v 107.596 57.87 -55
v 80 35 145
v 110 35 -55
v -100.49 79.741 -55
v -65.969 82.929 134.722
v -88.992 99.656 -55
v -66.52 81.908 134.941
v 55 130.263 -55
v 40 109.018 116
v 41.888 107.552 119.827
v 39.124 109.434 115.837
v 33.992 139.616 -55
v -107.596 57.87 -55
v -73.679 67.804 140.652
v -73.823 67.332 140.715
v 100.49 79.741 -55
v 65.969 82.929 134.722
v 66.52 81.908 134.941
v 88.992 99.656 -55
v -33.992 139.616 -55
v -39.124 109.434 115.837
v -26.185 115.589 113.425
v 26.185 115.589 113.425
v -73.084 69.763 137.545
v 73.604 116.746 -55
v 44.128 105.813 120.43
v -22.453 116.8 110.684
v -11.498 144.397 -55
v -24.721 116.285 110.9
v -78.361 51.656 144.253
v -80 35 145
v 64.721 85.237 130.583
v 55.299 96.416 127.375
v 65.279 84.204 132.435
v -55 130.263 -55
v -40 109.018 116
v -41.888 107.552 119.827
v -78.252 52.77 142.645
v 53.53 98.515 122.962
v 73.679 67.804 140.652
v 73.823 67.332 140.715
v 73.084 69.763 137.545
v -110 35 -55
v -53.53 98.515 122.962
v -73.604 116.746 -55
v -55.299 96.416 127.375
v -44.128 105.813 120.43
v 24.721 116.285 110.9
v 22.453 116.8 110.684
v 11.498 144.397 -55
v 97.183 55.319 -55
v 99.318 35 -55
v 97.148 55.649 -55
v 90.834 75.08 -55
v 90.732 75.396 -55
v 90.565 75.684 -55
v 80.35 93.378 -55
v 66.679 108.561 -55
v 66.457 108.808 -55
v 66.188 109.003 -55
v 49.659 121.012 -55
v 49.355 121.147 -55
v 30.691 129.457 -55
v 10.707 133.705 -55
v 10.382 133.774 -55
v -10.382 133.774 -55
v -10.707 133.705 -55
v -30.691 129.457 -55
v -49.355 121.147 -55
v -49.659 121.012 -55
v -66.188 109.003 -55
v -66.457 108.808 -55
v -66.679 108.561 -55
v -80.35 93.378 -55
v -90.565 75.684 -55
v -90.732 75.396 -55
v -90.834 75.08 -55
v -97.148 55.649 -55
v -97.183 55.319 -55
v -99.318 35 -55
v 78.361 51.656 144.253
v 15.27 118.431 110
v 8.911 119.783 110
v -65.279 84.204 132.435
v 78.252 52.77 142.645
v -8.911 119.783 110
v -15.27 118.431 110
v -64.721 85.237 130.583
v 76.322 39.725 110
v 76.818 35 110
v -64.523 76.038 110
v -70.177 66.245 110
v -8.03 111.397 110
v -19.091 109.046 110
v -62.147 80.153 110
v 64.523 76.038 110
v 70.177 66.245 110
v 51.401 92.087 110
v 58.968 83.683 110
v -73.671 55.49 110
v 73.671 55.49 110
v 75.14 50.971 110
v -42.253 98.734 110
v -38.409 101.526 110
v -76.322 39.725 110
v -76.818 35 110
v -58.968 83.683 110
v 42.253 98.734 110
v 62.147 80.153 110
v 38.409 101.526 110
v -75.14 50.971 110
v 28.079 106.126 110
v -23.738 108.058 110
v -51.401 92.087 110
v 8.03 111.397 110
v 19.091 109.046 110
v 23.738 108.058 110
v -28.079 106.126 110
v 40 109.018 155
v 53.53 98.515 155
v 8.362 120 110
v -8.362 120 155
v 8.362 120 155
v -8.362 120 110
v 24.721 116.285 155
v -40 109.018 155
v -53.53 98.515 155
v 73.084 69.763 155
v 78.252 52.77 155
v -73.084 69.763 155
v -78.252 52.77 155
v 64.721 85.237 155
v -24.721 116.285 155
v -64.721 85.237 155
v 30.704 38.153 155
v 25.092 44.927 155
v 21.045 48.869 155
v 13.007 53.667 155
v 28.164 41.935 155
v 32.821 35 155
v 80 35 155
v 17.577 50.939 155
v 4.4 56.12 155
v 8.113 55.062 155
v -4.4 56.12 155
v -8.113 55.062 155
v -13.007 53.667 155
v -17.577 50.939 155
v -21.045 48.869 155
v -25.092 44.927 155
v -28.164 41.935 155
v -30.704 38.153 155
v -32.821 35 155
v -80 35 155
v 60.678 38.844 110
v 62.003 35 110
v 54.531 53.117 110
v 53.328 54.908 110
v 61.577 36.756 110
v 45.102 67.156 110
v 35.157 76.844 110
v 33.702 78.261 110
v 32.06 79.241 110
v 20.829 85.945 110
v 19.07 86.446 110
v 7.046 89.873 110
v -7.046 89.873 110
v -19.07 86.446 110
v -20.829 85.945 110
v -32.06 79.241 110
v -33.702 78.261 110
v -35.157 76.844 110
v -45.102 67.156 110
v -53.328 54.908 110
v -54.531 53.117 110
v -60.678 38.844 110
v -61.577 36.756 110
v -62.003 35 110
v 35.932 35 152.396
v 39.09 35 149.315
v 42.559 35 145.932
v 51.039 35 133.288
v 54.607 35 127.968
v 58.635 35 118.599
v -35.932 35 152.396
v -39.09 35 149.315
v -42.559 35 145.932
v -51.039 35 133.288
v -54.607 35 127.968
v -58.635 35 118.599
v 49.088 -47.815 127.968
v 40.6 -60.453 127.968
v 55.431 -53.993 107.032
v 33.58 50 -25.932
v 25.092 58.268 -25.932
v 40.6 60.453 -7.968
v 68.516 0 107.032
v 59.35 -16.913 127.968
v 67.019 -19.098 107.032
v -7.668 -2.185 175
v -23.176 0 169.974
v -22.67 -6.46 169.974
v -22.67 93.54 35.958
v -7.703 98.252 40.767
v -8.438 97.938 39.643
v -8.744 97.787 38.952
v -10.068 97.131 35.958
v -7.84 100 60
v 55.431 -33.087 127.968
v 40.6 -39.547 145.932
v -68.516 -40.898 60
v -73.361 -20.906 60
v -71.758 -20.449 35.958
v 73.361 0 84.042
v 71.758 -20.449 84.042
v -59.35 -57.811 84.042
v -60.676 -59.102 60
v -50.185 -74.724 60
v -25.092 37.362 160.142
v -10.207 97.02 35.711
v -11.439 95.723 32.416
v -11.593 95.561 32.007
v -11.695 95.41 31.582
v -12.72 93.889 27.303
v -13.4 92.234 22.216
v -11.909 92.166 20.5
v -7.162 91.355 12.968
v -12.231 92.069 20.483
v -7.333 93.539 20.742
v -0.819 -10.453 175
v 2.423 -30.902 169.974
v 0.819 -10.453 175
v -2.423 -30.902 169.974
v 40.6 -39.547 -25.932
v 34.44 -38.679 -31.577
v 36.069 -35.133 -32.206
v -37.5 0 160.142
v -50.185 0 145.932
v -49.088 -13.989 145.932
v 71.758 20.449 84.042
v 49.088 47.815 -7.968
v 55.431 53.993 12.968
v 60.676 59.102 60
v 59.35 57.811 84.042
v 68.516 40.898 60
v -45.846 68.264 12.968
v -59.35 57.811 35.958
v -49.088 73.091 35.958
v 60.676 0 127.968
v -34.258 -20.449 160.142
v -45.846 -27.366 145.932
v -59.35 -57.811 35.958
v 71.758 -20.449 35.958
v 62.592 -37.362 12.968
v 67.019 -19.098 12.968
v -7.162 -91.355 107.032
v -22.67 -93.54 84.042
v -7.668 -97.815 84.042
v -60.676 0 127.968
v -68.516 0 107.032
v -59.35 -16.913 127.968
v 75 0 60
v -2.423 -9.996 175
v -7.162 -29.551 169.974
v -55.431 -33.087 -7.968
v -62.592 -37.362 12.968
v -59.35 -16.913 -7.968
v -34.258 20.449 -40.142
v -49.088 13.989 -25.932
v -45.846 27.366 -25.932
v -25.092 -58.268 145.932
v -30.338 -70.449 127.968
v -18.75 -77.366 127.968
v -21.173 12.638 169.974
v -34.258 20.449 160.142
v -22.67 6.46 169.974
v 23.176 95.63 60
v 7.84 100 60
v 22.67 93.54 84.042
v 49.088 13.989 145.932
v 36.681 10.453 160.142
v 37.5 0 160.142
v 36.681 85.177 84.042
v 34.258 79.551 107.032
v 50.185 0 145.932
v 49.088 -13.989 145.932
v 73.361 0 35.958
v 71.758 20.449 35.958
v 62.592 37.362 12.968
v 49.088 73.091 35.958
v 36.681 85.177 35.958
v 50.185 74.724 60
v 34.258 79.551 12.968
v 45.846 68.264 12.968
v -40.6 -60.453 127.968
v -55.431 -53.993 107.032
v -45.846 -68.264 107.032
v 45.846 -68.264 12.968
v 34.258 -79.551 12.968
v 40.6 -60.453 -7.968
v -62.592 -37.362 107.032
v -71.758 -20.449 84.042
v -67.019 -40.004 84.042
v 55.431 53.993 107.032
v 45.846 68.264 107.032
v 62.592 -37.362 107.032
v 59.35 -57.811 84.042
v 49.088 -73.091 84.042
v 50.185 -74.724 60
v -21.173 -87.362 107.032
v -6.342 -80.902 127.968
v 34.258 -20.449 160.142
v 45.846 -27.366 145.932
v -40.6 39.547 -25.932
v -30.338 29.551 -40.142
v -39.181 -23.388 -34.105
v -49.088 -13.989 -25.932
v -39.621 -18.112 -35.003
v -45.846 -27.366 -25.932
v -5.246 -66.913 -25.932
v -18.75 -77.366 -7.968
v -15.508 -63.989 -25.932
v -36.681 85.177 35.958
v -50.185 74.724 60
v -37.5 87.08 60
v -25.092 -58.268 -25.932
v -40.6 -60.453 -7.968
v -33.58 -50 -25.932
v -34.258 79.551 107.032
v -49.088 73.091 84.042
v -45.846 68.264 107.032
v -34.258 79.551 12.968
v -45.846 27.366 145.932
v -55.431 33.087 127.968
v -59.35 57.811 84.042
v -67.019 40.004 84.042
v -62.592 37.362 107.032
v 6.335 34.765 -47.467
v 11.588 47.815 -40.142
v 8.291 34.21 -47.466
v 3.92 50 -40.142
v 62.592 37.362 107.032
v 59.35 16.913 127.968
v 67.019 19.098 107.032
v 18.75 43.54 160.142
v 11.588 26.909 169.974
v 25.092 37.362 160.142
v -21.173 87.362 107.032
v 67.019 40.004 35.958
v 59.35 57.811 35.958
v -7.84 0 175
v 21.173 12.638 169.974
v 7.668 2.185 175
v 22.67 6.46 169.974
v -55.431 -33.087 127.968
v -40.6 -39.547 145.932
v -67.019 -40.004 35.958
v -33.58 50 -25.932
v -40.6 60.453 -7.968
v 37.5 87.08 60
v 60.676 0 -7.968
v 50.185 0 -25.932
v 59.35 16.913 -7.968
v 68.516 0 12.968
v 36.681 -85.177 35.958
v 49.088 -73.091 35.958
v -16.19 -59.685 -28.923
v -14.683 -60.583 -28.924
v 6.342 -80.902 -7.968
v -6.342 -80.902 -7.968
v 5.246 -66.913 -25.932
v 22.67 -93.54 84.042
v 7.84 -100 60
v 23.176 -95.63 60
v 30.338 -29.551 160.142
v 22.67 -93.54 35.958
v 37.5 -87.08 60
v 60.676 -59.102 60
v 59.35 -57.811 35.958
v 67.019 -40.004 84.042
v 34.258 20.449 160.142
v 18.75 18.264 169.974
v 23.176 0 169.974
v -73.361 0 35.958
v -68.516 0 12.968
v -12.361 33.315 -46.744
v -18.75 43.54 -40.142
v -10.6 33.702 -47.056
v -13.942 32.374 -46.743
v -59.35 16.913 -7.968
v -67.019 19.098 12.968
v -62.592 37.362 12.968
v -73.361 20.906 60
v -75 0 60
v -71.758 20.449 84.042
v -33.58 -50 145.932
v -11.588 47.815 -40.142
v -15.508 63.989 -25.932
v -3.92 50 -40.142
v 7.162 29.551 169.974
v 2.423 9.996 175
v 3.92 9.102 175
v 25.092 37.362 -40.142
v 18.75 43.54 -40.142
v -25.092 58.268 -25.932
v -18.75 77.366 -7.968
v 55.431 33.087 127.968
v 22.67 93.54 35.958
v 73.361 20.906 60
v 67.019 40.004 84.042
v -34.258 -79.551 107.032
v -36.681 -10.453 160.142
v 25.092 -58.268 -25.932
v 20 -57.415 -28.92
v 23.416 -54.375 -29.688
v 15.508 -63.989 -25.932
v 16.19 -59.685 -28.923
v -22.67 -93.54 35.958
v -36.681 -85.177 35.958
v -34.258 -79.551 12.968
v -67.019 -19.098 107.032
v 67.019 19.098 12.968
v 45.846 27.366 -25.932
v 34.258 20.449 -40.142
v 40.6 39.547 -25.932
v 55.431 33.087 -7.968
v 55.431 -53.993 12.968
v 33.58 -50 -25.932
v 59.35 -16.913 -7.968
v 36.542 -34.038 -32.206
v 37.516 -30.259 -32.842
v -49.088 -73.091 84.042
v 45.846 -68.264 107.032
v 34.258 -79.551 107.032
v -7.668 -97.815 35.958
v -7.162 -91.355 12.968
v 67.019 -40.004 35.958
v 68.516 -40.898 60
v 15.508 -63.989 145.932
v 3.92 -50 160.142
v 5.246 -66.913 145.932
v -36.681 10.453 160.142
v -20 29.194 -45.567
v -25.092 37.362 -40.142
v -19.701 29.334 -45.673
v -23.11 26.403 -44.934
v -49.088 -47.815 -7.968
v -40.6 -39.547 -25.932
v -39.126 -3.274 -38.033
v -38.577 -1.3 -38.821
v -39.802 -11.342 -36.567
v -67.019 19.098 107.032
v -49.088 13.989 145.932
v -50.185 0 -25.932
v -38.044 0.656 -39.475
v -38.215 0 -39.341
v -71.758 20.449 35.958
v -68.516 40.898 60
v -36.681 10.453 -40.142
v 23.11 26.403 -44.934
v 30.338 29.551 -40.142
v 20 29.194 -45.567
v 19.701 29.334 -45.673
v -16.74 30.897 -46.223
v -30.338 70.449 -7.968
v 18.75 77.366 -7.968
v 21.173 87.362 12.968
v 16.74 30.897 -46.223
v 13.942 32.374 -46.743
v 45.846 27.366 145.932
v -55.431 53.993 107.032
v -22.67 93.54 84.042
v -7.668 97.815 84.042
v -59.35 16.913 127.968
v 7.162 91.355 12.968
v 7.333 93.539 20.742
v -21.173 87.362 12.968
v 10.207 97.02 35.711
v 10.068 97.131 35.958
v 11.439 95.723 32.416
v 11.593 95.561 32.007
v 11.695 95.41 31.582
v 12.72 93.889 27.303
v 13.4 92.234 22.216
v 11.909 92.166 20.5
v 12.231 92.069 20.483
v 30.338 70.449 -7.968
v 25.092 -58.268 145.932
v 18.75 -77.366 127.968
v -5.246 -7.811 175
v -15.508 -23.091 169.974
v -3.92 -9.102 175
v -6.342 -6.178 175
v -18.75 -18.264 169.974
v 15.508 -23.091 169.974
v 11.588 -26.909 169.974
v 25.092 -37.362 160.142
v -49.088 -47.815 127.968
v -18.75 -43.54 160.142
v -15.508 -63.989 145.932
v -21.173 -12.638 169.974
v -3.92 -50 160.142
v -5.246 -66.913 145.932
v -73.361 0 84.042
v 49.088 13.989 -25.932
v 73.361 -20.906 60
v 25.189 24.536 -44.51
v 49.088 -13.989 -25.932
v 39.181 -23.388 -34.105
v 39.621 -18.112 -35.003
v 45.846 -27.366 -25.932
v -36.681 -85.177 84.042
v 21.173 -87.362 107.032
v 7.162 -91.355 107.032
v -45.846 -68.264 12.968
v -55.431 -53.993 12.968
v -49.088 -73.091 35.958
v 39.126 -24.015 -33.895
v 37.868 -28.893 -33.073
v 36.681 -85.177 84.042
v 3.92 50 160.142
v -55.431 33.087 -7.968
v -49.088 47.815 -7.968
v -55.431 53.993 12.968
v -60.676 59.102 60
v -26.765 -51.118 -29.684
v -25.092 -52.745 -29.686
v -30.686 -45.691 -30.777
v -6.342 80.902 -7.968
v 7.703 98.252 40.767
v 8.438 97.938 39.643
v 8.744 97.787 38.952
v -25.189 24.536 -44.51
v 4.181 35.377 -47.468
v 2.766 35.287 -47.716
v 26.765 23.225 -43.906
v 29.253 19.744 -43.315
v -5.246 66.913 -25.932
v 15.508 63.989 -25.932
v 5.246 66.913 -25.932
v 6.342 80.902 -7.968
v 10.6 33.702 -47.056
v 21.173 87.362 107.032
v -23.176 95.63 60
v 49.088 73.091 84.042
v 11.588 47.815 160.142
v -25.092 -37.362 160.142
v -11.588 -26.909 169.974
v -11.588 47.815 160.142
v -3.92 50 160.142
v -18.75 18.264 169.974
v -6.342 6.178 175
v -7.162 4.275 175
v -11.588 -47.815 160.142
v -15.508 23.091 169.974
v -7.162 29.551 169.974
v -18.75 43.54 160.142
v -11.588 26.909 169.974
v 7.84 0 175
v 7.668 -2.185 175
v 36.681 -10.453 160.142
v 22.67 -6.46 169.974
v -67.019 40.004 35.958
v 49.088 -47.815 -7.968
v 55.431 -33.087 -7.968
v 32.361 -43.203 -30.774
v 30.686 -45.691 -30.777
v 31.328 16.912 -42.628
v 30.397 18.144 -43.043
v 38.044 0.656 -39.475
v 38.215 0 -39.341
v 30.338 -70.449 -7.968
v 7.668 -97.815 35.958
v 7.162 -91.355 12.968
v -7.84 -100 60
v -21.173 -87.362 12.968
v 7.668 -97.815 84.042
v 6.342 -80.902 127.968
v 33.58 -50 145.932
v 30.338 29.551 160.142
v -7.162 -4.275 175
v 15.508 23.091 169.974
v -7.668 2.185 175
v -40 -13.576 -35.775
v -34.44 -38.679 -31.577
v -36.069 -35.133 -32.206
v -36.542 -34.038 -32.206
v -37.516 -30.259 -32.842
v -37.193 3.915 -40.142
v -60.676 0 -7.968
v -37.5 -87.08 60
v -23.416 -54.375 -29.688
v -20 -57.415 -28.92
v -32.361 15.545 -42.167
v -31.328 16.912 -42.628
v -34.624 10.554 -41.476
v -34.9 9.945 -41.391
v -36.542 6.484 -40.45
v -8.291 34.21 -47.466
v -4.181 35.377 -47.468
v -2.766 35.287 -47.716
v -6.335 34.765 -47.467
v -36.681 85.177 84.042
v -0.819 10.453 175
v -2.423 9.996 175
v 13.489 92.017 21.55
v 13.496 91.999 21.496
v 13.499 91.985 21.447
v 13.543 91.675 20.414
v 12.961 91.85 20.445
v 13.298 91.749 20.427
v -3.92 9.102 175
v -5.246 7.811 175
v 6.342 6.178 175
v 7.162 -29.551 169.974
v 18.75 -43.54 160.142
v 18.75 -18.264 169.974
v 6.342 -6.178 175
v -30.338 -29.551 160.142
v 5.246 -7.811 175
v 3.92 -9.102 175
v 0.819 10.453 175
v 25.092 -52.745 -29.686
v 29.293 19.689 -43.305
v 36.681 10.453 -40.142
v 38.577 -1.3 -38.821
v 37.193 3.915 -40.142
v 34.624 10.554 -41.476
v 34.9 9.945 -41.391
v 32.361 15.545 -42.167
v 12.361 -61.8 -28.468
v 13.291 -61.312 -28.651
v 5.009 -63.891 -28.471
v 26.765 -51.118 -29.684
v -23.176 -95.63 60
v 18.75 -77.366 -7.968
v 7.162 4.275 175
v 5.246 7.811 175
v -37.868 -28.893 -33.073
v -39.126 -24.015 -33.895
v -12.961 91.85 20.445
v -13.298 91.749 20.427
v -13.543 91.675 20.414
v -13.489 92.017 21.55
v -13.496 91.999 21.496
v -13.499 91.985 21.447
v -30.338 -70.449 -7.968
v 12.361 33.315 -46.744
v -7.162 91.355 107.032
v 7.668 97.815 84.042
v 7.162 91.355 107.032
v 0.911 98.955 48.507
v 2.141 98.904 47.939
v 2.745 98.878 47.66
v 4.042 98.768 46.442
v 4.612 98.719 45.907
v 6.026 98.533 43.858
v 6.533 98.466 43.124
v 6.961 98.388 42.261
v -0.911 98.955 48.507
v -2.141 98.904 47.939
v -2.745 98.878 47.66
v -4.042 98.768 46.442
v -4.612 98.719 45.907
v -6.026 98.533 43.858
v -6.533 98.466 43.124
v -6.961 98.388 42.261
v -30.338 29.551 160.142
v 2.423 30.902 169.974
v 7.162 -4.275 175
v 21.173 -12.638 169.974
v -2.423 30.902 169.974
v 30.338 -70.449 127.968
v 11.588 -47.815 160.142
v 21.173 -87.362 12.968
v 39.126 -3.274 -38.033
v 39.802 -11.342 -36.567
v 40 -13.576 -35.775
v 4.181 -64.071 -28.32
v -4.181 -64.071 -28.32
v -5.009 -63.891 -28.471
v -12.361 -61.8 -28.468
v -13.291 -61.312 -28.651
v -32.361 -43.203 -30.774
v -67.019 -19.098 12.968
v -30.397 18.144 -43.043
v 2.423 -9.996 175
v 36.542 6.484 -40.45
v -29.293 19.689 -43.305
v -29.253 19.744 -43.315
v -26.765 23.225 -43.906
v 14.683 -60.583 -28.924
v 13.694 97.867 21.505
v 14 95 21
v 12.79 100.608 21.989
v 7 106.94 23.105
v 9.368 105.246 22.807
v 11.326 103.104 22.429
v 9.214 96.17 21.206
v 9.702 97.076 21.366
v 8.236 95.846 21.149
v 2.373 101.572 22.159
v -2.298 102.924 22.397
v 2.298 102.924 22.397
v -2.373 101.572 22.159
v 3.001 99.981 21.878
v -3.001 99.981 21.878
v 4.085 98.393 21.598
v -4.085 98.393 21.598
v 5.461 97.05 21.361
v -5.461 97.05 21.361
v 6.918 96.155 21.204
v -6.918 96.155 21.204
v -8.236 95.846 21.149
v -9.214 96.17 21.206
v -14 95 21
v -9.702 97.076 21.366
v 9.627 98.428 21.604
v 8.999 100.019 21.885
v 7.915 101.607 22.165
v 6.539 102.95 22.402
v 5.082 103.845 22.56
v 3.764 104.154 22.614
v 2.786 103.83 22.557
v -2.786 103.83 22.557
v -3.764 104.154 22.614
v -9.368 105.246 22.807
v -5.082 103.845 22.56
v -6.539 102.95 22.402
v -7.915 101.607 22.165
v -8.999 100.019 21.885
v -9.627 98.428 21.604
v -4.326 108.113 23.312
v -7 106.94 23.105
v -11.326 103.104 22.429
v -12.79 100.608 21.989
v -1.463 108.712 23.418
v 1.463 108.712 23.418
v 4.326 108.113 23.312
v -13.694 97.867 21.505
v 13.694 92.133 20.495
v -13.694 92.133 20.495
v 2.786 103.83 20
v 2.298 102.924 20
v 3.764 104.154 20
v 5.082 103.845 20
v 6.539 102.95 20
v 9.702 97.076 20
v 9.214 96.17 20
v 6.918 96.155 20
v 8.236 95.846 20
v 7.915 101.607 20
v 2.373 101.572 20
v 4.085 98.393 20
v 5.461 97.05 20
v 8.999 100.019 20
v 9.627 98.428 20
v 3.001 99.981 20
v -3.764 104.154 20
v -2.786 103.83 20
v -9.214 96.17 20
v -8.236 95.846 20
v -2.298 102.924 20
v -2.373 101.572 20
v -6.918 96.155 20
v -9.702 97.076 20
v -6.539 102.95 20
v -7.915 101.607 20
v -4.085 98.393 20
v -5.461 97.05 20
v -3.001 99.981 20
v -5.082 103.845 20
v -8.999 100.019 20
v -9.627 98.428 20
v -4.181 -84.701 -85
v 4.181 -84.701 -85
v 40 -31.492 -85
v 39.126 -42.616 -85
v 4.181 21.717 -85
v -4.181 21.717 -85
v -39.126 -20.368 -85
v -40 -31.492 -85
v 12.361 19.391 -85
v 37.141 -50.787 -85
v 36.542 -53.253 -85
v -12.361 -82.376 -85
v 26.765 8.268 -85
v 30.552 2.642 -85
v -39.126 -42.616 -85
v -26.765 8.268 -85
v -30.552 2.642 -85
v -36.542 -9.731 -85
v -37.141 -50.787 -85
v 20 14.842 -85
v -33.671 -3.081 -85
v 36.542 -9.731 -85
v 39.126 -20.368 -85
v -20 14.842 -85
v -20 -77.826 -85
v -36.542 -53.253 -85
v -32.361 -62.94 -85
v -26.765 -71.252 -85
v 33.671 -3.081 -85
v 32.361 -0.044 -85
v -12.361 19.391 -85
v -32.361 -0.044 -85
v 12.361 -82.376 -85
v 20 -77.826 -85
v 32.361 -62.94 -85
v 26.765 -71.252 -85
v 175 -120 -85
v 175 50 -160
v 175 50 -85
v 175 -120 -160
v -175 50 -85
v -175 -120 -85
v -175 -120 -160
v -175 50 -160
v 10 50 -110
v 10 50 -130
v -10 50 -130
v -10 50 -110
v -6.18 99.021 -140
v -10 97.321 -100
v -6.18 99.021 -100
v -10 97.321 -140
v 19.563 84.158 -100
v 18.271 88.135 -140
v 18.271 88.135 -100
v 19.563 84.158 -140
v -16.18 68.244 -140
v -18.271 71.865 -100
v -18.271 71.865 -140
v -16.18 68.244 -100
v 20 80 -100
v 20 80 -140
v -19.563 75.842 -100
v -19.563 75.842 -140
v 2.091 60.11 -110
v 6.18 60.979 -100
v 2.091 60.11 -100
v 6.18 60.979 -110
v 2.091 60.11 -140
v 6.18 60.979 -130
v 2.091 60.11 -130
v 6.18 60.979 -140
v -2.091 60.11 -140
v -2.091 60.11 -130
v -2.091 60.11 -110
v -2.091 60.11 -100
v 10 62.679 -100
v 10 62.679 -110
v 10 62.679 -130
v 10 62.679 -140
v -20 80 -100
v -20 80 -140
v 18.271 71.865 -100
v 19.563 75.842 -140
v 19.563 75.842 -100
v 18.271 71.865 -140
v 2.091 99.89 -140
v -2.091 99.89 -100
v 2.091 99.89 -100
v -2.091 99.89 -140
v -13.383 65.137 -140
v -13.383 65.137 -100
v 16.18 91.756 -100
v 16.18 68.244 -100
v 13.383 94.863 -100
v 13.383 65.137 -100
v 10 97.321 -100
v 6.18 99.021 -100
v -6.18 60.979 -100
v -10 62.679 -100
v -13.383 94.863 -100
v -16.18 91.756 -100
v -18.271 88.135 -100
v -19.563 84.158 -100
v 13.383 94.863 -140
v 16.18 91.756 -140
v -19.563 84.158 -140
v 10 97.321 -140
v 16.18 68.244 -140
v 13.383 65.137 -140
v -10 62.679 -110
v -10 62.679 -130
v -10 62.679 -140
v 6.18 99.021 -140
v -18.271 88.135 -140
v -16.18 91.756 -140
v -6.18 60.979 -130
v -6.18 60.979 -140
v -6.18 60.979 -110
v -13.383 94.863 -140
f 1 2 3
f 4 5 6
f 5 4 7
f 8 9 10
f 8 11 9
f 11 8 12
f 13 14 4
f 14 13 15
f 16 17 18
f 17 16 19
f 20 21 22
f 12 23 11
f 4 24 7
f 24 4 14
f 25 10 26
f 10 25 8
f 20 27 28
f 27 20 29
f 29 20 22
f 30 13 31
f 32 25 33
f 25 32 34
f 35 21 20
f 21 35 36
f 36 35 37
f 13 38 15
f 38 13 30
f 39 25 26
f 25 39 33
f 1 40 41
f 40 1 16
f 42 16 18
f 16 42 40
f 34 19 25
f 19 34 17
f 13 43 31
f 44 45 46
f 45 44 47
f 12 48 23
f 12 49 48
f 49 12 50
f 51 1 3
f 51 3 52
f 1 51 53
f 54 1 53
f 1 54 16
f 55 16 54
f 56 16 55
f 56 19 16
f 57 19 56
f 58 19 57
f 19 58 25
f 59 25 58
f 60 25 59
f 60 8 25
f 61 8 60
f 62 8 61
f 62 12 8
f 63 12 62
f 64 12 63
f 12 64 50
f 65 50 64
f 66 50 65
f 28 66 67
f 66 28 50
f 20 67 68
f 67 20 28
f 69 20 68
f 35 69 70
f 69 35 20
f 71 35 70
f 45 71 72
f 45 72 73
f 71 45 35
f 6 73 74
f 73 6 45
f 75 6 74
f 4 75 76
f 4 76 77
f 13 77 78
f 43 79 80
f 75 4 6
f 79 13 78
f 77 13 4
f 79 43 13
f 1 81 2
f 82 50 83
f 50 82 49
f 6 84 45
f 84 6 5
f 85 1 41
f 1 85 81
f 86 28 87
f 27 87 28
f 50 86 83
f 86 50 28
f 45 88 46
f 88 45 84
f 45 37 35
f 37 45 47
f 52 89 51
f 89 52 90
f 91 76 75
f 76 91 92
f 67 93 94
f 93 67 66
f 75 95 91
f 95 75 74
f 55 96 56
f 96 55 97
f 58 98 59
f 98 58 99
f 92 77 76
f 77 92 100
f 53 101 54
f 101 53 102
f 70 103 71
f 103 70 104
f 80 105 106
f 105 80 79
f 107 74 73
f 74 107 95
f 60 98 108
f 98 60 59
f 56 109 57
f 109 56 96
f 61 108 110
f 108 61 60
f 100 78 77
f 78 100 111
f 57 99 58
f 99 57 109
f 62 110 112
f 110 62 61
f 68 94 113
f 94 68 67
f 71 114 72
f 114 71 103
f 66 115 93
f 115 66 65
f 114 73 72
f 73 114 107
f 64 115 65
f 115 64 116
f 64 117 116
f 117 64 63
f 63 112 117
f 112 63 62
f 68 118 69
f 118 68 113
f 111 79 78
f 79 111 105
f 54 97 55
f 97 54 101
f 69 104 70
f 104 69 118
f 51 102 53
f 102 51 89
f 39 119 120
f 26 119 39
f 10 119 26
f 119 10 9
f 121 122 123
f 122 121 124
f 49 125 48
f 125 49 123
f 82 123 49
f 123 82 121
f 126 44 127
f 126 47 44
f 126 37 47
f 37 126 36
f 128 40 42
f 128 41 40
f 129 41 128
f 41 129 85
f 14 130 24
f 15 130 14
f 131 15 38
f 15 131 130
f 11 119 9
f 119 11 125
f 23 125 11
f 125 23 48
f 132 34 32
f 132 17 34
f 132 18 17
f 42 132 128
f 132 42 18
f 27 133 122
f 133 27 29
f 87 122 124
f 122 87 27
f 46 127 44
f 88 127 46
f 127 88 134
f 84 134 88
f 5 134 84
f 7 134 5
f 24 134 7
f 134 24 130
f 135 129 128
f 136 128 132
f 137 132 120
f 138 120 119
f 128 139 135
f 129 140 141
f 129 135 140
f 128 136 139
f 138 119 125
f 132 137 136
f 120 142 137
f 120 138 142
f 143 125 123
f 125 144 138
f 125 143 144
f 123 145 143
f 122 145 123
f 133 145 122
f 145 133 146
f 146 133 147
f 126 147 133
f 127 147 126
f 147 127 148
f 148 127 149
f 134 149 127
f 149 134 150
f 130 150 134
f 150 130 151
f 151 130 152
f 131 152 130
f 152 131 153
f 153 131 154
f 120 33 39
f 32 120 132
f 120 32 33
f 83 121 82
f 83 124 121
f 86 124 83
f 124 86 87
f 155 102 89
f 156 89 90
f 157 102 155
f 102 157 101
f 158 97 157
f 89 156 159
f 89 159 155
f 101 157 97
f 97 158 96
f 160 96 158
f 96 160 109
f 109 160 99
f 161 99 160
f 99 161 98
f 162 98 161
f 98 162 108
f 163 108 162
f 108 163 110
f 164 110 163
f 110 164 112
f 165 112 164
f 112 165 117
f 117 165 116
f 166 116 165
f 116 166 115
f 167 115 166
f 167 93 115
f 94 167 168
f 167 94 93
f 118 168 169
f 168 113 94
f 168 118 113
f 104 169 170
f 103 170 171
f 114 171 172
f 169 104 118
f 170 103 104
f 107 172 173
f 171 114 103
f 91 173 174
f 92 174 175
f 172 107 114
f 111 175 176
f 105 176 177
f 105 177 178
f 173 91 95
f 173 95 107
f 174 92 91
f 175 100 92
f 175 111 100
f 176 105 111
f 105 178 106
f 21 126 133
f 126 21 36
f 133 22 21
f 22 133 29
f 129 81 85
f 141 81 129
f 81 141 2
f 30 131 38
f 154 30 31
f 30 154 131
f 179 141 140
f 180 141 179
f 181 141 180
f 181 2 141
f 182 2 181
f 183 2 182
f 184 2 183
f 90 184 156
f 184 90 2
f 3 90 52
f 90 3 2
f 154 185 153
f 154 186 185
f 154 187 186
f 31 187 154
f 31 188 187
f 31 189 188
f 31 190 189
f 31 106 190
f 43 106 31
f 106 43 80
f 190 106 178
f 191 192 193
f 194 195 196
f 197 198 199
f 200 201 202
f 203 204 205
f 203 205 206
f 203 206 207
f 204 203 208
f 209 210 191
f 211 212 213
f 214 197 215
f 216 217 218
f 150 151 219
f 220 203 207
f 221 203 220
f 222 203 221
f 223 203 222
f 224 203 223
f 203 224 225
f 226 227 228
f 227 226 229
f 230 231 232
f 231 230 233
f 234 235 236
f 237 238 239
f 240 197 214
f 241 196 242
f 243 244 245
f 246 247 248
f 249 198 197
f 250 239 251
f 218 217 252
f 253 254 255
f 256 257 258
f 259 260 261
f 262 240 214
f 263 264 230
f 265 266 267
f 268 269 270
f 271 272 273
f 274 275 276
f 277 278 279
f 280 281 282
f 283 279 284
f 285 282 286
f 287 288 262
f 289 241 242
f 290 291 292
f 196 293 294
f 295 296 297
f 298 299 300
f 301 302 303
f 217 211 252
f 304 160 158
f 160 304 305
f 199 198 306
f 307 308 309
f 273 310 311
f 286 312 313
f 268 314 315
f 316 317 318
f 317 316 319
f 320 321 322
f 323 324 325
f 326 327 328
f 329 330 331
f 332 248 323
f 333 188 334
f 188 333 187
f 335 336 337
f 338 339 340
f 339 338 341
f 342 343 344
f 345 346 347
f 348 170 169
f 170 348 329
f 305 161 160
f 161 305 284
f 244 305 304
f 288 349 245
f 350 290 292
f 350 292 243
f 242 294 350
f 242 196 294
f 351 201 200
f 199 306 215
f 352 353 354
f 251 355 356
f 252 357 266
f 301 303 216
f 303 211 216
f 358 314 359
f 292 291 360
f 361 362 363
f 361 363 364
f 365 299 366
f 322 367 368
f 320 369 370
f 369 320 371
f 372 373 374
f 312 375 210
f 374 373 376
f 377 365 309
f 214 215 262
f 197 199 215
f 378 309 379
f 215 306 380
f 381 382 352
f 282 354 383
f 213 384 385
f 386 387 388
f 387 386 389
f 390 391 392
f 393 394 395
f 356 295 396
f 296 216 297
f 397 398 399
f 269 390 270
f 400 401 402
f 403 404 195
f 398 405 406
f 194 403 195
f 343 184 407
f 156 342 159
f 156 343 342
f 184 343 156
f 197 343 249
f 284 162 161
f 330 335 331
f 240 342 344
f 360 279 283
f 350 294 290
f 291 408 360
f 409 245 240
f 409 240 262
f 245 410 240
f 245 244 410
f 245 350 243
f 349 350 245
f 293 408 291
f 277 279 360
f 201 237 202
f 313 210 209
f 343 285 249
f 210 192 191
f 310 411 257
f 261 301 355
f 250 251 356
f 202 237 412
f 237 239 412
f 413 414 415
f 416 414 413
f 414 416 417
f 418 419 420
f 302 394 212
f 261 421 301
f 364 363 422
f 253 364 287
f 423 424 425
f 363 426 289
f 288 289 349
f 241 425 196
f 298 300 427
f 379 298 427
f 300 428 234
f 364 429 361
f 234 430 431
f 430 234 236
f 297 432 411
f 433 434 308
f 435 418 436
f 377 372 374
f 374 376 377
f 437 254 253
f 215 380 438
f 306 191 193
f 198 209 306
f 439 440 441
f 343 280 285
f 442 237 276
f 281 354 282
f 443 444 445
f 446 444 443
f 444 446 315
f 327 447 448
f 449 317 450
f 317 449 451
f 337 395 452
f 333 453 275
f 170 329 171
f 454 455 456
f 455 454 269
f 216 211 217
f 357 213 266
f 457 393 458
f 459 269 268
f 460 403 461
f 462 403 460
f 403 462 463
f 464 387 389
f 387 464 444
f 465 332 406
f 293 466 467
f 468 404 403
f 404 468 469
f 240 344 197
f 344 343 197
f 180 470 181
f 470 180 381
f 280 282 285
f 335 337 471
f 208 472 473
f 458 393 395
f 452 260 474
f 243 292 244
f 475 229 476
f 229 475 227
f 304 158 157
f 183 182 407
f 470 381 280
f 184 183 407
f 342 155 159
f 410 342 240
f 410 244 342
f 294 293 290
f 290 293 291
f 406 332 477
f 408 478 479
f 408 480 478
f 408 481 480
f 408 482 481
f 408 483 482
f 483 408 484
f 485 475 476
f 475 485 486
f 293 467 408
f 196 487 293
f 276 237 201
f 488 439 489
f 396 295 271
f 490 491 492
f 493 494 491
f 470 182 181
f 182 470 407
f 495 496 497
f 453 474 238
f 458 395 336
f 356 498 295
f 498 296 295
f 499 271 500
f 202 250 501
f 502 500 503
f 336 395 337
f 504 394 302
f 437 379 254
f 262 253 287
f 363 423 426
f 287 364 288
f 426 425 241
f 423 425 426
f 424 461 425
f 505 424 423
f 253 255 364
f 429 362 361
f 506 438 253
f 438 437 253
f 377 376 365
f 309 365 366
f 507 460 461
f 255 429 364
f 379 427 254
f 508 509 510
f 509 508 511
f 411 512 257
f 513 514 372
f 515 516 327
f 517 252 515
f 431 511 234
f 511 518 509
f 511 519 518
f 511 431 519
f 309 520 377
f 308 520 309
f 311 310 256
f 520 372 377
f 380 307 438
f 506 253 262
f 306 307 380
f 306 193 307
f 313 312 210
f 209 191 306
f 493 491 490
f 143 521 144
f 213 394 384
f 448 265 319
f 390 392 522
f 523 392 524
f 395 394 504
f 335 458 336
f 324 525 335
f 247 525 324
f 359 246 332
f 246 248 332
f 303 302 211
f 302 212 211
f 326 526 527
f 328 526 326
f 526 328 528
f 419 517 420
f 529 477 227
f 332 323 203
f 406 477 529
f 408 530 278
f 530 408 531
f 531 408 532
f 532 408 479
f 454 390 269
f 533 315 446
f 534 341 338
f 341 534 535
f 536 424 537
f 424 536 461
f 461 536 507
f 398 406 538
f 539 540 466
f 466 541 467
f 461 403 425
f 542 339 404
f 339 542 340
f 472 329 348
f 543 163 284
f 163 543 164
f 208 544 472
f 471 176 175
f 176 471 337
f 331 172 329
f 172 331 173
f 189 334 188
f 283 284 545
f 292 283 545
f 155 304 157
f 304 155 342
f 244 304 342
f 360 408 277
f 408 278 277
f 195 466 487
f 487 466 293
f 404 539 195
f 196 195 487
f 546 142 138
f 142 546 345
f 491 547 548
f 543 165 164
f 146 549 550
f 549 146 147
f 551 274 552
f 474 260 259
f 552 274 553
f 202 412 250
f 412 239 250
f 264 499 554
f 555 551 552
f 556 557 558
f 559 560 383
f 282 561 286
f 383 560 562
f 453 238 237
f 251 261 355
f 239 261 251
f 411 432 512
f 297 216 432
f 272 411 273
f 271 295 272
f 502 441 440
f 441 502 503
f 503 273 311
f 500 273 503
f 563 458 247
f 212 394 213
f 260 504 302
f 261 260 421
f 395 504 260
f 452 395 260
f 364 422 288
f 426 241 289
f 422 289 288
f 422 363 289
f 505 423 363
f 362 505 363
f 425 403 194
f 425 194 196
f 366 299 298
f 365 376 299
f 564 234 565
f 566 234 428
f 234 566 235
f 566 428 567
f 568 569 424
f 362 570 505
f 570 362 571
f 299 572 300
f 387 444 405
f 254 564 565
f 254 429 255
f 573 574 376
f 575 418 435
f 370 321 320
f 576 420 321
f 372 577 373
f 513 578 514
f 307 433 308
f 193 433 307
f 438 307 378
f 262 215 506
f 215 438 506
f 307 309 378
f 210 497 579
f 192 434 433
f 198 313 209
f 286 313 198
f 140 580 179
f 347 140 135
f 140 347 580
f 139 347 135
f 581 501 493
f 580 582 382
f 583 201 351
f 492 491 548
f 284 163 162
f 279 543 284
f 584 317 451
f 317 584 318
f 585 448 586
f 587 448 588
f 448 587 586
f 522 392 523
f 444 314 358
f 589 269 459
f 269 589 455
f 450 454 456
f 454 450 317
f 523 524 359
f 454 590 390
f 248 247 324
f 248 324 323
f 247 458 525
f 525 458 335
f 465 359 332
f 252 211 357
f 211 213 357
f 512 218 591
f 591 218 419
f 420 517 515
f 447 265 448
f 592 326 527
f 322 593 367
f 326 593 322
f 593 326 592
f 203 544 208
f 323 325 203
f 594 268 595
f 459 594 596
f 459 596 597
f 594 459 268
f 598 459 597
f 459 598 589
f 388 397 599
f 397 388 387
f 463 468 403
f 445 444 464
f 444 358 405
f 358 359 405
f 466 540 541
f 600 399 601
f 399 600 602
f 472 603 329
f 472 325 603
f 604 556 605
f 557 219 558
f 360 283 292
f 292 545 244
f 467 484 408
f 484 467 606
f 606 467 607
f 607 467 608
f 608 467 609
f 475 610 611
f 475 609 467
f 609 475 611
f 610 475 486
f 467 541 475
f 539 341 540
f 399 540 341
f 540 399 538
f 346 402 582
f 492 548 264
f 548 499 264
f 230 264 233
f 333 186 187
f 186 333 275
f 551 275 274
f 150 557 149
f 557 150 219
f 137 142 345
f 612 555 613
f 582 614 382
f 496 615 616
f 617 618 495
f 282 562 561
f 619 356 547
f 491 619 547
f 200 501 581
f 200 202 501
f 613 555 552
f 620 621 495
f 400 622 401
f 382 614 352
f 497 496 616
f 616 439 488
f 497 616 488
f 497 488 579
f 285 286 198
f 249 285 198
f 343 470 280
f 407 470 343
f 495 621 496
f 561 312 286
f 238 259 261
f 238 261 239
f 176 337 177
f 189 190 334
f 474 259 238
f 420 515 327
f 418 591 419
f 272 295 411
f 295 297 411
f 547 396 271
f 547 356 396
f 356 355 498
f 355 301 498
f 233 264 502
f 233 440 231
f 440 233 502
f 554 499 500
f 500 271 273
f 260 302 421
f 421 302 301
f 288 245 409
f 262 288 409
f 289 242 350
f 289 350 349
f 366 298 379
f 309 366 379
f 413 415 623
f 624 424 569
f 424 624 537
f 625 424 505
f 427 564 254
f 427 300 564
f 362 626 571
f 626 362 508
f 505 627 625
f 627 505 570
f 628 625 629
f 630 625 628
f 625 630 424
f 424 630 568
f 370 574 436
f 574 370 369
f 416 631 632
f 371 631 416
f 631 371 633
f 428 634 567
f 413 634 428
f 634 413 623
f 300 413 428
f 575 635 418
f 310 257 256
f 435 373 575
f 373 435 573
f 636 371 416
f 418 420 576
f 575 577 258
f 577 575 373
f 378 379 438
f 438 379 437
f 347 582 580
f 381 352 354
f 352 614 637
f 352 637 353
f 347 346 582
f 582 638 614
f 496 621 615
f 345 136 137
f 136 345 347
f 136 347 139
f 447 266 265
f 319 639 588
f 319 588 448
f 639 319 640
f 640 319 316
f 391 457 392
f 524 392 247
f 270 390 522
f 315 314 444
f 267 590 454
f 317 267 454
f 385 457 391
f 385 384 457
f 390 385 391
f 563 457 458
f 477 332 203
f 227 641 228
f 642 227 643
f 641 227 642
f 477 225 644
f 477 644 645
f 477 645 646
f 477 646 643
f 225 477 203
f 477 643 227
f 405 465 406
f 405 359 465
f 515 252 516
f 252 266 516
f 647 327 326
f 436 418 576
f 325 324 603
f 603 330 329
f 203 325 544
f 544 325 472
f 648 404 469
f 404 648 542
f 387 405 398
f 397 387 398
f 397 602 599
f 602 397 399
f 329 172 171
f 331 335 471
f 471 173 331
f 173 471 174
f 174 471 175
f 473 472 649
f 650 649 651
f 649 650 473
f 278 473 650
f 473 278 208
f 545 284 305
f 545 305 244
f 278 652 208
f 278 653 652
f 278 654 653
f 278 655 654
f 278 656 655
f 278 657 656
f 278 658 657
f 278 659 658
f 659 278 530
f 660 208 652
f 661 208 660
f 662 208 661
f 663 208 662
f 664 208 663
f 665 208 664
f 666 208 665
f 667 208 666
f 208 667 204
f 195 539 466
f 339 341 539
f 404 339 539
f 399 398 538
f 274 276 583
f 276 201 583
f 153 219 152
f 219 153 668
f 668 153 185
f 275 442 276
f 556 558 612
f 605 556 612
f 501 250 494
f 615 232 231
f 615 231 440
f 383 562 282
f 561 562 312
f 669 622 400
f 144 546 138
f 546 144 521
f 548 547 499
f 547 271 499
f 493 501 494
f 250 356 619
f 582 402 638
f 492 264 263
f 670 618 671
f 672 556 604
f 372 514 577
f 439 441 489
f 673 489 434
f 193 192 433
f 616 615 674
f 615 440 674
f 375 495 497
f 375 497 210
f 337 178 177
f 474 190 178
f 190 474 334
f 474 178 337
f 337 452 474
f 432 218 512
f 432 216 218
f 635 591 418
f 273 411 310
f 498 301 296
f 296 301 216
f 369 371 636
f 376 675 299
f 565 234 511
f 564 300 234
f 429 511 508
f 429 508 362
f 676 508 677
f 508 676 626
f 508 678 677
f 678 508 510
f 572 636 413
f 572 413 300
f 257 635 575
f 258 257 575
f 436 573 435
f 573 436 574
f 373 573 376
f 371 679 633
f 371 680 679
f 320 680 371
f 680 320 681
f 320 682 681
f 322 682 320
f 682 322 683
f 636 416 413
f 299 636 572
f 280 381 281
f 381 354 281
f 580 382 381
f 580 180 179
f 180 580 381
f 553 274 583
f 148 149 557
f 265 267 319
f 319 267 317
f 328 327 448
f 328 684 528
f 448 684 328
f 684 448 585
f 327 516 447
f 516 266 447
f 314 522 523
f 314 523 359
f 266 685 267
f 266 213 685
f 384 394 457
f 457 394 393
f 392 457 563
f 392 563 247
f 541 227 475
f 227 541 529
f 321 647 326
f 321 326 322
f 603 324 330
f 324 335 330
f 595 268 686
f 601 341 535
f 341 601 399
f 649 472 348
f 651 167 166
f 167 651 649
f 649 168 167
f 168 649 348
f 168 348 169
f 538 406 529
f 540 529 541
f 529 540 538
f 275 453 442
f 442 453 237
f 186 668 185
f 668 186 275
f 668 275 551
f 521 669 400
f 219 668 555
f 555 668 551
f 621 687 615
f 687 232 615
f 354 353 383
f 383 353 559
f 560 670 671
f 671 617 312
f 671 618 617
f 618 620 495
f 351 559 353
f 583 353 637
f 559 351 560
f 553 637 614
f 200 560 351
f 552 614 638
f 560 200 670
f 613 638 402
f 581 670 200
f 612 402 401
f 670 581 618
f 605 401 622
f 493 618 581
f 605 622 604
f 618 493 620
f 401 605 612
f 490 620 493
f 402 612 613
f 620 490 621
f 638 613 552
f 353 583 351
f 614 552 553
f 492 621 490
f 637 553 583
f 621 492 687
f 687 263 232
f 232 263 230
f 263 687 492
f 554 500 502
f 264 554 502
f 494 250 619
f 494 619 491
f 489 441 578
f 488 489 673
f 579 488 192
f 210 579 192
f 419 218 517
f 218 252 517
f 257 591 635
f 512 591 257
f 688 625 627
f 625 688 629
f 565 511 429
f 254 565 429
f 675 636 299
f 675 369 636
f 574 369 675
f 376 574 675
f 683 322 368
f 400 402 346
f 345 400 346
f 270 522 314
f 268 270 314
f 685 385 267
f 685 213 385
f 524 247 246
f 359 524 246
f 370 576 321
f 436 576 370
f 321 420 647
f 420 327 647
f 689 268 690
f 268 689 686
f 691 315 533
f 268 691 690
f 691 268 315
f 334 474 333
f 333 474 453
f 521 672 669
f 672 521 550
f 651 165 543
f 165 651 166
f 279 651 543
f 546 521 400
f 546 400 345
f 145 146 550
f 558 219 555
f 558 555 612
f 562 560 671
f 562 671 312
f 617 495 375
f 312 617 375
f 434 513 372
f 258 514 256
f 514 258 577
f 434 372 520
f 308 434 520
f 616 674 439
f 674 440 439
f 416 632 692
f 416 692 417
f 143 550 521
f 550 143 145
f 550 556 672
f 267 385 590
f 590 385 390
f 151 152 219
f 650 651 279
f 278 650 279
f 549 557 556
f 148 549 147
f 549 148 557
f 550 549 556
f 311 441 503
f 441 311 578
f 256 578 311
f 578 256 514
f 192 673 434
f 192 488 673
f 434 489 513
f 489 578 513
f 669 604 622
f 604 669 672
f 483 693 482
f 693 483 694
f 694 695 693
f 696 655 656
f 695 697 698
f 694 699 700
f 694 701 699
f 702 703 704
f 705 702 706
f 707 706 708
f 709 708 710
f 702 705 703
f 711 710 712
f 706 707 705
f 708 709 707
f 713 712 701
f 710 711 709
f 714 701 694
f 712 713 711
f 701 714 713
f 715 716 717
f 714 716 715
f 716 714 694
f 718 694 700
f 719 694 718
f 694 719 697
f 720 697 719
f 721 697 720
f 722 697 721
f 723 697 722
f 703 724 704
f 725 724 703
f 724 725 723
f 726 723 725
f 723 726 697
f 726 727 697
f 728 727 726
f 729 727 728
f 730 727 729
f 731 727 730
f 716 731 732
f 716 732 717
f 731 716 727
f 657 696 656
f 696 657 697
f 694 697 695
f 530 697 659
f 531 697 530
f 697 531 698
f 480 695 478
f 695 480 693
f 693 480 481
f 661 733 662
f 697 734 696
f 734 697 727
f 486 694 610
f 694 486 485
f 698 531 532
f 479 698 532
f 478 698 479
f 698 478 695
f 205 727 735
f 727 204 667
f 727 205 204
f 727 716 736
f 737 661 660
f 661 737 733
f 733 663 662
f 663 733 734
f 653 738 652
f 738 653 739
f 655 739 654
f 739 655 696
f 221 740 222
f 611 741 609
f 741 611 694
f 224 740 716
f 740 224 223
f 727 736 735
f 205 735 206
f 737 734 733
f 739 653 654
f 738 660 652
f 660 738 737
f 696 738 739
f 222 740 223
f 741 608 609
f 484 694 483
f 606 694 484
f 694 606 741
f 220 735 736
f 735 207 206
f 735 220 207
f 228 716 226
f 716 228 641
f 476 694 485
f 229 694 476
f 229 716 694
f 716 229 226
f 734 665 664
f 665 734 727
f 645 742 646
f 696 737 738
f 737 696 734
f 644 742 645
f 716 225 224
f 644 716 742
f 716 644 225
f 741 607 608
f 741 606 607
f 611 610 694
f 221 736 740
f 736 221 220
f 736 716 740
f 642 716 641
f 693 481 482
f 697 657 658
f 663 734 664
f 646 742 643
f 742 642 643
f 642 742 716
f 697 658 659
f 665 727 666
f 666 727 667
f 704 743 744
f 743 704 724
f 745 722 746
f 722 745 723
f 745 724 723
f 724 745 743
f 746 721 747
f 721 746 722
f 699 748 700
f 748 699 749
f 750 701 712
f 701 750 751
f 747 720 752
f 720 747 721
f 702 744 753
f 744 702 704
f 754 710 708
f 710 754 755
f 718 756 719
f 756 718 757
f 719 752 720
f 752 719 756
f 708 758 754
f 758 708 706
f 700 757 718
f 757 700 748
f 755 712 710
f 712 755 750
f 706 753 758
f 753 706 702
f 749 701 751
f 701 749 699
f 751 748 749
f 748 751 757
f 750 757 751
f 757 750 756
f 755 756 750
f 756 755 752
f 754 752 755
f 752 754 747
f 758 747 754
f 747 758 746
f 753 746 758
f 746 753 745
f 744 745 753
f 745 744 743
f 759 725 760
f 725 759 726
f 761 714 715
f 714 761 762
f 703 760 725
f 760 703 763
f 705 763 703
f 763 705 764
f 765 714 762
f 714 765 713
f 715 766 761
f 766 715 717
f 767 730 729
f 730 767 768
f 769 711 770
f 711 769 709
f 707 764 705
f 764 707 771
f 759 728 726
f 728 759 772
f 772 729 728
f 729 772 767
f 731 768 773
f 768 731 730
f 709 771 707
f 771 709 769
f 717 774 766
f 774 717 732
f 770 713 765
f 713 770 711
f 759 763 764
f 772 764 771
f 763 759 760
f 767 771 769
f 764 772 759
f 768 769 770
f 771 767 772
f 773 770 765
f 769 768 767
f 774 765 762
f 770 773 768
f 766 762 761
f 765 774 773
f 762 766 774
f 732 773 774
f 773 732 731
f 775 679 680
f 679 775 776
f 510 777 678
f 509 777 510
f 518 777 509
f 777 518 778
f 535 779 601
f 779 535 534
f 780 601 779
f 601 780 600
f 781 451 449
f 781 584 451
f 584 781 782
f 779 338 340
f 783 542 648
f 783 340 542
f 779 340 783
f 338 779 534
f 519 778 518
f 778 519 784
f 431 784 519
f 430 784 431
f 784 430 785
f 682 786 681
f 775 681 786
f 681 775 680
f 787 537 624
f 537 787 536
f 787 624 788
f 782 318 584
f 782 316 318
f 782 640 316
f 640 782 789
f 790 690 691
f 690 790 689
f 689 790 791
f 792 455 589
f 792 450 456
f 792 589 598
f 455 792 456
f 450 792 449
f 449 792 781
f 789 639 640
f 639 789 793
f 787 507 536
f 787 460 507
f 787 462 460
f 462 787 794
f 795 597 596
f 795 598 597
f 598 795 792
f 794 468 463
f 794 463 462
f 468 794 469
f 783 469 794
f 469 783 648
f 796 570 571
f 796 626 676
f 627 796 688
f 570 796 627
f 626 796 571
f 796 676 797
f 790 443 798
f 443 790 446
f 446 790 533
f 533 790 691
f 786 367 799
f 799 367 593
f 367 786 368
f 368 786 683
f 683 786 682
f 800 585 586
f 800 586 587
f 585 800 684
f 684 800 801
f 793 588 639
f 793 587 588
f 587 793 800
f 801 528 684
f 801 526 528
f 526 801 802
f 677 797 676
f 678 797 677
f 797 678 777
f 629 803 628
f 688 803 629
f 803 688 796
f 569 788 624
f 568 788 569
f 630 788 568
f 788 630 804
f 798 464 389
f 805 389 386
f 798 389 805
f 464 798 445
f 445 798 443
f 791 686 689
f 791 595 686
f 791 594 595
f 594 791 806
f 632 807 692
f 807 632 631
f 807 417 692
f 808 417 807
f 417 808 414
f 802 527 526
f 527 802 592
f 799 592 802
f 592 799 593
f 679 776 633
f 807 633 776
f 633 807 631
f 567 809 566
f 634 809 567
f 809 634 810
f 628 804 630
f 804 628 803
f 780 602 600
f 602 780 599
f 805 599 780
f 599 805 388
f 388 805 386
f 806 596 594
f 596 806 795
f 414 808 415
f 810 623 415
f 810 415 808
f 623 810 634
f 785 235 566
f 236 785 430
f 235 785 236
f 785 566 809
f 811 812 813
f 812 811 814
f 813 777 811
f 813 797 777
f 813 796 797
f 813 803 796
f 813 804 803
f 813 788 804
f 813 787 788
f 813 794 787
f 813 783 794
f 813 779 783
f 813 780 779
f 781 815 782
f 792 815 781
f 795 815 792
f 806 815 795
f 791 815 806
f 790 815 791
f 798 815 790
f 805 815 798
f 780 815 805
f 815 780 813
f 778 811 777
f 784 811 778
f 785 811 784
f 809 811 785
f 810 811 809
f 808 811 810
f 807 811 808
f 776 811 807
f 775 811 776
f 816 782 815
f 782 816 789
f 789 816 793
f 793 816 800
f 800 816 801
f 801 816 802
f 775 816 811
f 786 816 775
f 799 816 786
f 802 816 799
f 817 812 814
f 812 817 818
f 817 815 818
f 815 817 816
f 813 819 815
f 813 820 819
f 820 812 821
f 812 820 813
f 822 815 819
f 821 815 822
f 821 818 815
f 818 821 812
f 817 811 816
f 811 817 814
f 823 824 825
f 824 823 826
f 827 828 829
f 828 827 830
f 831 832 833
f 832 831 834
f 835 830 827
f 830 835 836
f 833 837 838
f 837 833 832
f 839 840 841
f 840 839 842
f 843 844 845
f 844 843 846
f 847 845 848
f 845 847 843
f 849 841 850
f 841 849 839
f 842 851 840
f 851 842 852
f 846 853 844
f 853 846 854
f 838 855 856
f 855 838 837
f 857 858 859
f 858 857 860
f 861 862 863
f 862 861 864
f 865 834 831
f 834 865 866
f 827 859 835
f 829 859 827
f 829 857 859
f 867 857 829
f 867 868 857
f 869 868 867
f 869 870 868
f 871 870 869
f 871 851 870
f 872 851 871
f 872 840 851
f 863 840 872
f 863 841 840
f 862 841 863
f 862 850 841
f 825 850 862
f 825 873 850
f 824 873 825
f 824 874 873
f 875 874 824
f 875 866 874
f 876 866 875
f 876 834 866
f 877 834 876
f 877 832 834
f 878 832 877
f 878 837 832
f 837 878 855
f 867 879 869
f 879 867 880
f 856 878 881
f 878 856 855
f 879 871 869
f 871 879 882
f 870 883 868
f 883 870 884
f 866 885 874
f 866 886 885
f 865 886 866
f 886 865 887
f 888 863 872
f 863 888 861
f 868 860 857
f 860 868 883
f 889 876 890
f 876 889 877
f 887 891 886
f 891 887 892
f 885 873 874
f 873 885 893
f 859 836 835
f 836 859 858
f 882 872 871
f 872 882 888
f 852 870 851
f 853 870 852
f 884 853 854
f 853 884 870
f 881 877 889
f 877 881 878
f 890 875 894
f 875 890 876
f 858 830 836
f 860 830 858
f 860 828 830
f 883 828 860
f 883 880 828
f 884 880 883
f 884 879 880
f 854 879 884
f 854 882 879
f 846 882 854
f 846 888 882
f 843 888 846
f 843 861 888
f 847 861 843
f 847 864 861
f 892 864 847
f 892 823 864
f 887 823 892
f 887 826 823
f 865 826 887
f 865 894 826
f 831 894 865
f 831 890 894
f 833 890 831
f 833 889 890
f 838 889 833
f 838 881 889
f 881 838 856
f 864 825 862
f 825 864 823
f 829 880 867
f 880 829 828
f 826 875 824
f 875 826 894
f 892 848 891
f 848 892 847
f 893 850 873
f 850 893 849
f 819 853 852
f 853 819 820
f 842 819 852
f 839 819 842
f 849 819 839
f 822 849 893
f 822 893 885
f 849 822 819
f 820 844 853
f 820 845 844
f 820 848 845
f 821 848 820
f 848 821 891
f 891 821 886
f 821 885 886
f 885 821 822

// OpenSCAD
translate([0,0,60])
    union() {

        difference() {
            
            union() {
                
                // shield
                difference() {
                    translate([0,35,-115])
                        cylinder(h=200, r1=110, r2=80); // front
                    translate([0,35,-120])
                        cylinder(h=220, r1=100, r2=70); // back
                }
                
                // connection
                translate([0,35,50])
                    linear_extrude(height=45) // recess ignored
                        resize([160,170])
                            circle(d=100);
            }
            
            // remove half of above volumes
            translate([-150,-365,-150])
                cube(400);  

        }

        // Dimensions: https://en.wikipedia.org/wiki/Human_head#Average_head_sizes 

        // head
        resize(newsize=[150, 200, 230])
            sphere(r=100);

        // nose
        translate([0,95,-39])
            rotate(a=[10,0,0])
                cylinder(h=45, r1=14, r2=5);
        
        // nostrils
        translate([6,100,-40])
            rotate(a=[0,0,40])
                linear_extrude(height=5)
                    resize([5, 10])
                        circle(d=10);
        translate([-6,100,-40])
            rotate(a=[0,0,-40])
                linear_extrude(height=5)
                    resize([5, 10])
                        circle(d=10); 
        
        // neck
        rotate([-20,0,0])
            translate([0,20,-200])
                linear_extrude(height=200)
                    resize([80,100])
                        circle(d=100);
        
        // body
        translate([-175,-120,-220])
            cube([350,170,75]);
        
        // fan
        translate([0,80,-200])
            linear_extrude(height=40)
                circle(d=40);
        translate([-10,-20,-190])
            cube([20,100,20]);
    }
